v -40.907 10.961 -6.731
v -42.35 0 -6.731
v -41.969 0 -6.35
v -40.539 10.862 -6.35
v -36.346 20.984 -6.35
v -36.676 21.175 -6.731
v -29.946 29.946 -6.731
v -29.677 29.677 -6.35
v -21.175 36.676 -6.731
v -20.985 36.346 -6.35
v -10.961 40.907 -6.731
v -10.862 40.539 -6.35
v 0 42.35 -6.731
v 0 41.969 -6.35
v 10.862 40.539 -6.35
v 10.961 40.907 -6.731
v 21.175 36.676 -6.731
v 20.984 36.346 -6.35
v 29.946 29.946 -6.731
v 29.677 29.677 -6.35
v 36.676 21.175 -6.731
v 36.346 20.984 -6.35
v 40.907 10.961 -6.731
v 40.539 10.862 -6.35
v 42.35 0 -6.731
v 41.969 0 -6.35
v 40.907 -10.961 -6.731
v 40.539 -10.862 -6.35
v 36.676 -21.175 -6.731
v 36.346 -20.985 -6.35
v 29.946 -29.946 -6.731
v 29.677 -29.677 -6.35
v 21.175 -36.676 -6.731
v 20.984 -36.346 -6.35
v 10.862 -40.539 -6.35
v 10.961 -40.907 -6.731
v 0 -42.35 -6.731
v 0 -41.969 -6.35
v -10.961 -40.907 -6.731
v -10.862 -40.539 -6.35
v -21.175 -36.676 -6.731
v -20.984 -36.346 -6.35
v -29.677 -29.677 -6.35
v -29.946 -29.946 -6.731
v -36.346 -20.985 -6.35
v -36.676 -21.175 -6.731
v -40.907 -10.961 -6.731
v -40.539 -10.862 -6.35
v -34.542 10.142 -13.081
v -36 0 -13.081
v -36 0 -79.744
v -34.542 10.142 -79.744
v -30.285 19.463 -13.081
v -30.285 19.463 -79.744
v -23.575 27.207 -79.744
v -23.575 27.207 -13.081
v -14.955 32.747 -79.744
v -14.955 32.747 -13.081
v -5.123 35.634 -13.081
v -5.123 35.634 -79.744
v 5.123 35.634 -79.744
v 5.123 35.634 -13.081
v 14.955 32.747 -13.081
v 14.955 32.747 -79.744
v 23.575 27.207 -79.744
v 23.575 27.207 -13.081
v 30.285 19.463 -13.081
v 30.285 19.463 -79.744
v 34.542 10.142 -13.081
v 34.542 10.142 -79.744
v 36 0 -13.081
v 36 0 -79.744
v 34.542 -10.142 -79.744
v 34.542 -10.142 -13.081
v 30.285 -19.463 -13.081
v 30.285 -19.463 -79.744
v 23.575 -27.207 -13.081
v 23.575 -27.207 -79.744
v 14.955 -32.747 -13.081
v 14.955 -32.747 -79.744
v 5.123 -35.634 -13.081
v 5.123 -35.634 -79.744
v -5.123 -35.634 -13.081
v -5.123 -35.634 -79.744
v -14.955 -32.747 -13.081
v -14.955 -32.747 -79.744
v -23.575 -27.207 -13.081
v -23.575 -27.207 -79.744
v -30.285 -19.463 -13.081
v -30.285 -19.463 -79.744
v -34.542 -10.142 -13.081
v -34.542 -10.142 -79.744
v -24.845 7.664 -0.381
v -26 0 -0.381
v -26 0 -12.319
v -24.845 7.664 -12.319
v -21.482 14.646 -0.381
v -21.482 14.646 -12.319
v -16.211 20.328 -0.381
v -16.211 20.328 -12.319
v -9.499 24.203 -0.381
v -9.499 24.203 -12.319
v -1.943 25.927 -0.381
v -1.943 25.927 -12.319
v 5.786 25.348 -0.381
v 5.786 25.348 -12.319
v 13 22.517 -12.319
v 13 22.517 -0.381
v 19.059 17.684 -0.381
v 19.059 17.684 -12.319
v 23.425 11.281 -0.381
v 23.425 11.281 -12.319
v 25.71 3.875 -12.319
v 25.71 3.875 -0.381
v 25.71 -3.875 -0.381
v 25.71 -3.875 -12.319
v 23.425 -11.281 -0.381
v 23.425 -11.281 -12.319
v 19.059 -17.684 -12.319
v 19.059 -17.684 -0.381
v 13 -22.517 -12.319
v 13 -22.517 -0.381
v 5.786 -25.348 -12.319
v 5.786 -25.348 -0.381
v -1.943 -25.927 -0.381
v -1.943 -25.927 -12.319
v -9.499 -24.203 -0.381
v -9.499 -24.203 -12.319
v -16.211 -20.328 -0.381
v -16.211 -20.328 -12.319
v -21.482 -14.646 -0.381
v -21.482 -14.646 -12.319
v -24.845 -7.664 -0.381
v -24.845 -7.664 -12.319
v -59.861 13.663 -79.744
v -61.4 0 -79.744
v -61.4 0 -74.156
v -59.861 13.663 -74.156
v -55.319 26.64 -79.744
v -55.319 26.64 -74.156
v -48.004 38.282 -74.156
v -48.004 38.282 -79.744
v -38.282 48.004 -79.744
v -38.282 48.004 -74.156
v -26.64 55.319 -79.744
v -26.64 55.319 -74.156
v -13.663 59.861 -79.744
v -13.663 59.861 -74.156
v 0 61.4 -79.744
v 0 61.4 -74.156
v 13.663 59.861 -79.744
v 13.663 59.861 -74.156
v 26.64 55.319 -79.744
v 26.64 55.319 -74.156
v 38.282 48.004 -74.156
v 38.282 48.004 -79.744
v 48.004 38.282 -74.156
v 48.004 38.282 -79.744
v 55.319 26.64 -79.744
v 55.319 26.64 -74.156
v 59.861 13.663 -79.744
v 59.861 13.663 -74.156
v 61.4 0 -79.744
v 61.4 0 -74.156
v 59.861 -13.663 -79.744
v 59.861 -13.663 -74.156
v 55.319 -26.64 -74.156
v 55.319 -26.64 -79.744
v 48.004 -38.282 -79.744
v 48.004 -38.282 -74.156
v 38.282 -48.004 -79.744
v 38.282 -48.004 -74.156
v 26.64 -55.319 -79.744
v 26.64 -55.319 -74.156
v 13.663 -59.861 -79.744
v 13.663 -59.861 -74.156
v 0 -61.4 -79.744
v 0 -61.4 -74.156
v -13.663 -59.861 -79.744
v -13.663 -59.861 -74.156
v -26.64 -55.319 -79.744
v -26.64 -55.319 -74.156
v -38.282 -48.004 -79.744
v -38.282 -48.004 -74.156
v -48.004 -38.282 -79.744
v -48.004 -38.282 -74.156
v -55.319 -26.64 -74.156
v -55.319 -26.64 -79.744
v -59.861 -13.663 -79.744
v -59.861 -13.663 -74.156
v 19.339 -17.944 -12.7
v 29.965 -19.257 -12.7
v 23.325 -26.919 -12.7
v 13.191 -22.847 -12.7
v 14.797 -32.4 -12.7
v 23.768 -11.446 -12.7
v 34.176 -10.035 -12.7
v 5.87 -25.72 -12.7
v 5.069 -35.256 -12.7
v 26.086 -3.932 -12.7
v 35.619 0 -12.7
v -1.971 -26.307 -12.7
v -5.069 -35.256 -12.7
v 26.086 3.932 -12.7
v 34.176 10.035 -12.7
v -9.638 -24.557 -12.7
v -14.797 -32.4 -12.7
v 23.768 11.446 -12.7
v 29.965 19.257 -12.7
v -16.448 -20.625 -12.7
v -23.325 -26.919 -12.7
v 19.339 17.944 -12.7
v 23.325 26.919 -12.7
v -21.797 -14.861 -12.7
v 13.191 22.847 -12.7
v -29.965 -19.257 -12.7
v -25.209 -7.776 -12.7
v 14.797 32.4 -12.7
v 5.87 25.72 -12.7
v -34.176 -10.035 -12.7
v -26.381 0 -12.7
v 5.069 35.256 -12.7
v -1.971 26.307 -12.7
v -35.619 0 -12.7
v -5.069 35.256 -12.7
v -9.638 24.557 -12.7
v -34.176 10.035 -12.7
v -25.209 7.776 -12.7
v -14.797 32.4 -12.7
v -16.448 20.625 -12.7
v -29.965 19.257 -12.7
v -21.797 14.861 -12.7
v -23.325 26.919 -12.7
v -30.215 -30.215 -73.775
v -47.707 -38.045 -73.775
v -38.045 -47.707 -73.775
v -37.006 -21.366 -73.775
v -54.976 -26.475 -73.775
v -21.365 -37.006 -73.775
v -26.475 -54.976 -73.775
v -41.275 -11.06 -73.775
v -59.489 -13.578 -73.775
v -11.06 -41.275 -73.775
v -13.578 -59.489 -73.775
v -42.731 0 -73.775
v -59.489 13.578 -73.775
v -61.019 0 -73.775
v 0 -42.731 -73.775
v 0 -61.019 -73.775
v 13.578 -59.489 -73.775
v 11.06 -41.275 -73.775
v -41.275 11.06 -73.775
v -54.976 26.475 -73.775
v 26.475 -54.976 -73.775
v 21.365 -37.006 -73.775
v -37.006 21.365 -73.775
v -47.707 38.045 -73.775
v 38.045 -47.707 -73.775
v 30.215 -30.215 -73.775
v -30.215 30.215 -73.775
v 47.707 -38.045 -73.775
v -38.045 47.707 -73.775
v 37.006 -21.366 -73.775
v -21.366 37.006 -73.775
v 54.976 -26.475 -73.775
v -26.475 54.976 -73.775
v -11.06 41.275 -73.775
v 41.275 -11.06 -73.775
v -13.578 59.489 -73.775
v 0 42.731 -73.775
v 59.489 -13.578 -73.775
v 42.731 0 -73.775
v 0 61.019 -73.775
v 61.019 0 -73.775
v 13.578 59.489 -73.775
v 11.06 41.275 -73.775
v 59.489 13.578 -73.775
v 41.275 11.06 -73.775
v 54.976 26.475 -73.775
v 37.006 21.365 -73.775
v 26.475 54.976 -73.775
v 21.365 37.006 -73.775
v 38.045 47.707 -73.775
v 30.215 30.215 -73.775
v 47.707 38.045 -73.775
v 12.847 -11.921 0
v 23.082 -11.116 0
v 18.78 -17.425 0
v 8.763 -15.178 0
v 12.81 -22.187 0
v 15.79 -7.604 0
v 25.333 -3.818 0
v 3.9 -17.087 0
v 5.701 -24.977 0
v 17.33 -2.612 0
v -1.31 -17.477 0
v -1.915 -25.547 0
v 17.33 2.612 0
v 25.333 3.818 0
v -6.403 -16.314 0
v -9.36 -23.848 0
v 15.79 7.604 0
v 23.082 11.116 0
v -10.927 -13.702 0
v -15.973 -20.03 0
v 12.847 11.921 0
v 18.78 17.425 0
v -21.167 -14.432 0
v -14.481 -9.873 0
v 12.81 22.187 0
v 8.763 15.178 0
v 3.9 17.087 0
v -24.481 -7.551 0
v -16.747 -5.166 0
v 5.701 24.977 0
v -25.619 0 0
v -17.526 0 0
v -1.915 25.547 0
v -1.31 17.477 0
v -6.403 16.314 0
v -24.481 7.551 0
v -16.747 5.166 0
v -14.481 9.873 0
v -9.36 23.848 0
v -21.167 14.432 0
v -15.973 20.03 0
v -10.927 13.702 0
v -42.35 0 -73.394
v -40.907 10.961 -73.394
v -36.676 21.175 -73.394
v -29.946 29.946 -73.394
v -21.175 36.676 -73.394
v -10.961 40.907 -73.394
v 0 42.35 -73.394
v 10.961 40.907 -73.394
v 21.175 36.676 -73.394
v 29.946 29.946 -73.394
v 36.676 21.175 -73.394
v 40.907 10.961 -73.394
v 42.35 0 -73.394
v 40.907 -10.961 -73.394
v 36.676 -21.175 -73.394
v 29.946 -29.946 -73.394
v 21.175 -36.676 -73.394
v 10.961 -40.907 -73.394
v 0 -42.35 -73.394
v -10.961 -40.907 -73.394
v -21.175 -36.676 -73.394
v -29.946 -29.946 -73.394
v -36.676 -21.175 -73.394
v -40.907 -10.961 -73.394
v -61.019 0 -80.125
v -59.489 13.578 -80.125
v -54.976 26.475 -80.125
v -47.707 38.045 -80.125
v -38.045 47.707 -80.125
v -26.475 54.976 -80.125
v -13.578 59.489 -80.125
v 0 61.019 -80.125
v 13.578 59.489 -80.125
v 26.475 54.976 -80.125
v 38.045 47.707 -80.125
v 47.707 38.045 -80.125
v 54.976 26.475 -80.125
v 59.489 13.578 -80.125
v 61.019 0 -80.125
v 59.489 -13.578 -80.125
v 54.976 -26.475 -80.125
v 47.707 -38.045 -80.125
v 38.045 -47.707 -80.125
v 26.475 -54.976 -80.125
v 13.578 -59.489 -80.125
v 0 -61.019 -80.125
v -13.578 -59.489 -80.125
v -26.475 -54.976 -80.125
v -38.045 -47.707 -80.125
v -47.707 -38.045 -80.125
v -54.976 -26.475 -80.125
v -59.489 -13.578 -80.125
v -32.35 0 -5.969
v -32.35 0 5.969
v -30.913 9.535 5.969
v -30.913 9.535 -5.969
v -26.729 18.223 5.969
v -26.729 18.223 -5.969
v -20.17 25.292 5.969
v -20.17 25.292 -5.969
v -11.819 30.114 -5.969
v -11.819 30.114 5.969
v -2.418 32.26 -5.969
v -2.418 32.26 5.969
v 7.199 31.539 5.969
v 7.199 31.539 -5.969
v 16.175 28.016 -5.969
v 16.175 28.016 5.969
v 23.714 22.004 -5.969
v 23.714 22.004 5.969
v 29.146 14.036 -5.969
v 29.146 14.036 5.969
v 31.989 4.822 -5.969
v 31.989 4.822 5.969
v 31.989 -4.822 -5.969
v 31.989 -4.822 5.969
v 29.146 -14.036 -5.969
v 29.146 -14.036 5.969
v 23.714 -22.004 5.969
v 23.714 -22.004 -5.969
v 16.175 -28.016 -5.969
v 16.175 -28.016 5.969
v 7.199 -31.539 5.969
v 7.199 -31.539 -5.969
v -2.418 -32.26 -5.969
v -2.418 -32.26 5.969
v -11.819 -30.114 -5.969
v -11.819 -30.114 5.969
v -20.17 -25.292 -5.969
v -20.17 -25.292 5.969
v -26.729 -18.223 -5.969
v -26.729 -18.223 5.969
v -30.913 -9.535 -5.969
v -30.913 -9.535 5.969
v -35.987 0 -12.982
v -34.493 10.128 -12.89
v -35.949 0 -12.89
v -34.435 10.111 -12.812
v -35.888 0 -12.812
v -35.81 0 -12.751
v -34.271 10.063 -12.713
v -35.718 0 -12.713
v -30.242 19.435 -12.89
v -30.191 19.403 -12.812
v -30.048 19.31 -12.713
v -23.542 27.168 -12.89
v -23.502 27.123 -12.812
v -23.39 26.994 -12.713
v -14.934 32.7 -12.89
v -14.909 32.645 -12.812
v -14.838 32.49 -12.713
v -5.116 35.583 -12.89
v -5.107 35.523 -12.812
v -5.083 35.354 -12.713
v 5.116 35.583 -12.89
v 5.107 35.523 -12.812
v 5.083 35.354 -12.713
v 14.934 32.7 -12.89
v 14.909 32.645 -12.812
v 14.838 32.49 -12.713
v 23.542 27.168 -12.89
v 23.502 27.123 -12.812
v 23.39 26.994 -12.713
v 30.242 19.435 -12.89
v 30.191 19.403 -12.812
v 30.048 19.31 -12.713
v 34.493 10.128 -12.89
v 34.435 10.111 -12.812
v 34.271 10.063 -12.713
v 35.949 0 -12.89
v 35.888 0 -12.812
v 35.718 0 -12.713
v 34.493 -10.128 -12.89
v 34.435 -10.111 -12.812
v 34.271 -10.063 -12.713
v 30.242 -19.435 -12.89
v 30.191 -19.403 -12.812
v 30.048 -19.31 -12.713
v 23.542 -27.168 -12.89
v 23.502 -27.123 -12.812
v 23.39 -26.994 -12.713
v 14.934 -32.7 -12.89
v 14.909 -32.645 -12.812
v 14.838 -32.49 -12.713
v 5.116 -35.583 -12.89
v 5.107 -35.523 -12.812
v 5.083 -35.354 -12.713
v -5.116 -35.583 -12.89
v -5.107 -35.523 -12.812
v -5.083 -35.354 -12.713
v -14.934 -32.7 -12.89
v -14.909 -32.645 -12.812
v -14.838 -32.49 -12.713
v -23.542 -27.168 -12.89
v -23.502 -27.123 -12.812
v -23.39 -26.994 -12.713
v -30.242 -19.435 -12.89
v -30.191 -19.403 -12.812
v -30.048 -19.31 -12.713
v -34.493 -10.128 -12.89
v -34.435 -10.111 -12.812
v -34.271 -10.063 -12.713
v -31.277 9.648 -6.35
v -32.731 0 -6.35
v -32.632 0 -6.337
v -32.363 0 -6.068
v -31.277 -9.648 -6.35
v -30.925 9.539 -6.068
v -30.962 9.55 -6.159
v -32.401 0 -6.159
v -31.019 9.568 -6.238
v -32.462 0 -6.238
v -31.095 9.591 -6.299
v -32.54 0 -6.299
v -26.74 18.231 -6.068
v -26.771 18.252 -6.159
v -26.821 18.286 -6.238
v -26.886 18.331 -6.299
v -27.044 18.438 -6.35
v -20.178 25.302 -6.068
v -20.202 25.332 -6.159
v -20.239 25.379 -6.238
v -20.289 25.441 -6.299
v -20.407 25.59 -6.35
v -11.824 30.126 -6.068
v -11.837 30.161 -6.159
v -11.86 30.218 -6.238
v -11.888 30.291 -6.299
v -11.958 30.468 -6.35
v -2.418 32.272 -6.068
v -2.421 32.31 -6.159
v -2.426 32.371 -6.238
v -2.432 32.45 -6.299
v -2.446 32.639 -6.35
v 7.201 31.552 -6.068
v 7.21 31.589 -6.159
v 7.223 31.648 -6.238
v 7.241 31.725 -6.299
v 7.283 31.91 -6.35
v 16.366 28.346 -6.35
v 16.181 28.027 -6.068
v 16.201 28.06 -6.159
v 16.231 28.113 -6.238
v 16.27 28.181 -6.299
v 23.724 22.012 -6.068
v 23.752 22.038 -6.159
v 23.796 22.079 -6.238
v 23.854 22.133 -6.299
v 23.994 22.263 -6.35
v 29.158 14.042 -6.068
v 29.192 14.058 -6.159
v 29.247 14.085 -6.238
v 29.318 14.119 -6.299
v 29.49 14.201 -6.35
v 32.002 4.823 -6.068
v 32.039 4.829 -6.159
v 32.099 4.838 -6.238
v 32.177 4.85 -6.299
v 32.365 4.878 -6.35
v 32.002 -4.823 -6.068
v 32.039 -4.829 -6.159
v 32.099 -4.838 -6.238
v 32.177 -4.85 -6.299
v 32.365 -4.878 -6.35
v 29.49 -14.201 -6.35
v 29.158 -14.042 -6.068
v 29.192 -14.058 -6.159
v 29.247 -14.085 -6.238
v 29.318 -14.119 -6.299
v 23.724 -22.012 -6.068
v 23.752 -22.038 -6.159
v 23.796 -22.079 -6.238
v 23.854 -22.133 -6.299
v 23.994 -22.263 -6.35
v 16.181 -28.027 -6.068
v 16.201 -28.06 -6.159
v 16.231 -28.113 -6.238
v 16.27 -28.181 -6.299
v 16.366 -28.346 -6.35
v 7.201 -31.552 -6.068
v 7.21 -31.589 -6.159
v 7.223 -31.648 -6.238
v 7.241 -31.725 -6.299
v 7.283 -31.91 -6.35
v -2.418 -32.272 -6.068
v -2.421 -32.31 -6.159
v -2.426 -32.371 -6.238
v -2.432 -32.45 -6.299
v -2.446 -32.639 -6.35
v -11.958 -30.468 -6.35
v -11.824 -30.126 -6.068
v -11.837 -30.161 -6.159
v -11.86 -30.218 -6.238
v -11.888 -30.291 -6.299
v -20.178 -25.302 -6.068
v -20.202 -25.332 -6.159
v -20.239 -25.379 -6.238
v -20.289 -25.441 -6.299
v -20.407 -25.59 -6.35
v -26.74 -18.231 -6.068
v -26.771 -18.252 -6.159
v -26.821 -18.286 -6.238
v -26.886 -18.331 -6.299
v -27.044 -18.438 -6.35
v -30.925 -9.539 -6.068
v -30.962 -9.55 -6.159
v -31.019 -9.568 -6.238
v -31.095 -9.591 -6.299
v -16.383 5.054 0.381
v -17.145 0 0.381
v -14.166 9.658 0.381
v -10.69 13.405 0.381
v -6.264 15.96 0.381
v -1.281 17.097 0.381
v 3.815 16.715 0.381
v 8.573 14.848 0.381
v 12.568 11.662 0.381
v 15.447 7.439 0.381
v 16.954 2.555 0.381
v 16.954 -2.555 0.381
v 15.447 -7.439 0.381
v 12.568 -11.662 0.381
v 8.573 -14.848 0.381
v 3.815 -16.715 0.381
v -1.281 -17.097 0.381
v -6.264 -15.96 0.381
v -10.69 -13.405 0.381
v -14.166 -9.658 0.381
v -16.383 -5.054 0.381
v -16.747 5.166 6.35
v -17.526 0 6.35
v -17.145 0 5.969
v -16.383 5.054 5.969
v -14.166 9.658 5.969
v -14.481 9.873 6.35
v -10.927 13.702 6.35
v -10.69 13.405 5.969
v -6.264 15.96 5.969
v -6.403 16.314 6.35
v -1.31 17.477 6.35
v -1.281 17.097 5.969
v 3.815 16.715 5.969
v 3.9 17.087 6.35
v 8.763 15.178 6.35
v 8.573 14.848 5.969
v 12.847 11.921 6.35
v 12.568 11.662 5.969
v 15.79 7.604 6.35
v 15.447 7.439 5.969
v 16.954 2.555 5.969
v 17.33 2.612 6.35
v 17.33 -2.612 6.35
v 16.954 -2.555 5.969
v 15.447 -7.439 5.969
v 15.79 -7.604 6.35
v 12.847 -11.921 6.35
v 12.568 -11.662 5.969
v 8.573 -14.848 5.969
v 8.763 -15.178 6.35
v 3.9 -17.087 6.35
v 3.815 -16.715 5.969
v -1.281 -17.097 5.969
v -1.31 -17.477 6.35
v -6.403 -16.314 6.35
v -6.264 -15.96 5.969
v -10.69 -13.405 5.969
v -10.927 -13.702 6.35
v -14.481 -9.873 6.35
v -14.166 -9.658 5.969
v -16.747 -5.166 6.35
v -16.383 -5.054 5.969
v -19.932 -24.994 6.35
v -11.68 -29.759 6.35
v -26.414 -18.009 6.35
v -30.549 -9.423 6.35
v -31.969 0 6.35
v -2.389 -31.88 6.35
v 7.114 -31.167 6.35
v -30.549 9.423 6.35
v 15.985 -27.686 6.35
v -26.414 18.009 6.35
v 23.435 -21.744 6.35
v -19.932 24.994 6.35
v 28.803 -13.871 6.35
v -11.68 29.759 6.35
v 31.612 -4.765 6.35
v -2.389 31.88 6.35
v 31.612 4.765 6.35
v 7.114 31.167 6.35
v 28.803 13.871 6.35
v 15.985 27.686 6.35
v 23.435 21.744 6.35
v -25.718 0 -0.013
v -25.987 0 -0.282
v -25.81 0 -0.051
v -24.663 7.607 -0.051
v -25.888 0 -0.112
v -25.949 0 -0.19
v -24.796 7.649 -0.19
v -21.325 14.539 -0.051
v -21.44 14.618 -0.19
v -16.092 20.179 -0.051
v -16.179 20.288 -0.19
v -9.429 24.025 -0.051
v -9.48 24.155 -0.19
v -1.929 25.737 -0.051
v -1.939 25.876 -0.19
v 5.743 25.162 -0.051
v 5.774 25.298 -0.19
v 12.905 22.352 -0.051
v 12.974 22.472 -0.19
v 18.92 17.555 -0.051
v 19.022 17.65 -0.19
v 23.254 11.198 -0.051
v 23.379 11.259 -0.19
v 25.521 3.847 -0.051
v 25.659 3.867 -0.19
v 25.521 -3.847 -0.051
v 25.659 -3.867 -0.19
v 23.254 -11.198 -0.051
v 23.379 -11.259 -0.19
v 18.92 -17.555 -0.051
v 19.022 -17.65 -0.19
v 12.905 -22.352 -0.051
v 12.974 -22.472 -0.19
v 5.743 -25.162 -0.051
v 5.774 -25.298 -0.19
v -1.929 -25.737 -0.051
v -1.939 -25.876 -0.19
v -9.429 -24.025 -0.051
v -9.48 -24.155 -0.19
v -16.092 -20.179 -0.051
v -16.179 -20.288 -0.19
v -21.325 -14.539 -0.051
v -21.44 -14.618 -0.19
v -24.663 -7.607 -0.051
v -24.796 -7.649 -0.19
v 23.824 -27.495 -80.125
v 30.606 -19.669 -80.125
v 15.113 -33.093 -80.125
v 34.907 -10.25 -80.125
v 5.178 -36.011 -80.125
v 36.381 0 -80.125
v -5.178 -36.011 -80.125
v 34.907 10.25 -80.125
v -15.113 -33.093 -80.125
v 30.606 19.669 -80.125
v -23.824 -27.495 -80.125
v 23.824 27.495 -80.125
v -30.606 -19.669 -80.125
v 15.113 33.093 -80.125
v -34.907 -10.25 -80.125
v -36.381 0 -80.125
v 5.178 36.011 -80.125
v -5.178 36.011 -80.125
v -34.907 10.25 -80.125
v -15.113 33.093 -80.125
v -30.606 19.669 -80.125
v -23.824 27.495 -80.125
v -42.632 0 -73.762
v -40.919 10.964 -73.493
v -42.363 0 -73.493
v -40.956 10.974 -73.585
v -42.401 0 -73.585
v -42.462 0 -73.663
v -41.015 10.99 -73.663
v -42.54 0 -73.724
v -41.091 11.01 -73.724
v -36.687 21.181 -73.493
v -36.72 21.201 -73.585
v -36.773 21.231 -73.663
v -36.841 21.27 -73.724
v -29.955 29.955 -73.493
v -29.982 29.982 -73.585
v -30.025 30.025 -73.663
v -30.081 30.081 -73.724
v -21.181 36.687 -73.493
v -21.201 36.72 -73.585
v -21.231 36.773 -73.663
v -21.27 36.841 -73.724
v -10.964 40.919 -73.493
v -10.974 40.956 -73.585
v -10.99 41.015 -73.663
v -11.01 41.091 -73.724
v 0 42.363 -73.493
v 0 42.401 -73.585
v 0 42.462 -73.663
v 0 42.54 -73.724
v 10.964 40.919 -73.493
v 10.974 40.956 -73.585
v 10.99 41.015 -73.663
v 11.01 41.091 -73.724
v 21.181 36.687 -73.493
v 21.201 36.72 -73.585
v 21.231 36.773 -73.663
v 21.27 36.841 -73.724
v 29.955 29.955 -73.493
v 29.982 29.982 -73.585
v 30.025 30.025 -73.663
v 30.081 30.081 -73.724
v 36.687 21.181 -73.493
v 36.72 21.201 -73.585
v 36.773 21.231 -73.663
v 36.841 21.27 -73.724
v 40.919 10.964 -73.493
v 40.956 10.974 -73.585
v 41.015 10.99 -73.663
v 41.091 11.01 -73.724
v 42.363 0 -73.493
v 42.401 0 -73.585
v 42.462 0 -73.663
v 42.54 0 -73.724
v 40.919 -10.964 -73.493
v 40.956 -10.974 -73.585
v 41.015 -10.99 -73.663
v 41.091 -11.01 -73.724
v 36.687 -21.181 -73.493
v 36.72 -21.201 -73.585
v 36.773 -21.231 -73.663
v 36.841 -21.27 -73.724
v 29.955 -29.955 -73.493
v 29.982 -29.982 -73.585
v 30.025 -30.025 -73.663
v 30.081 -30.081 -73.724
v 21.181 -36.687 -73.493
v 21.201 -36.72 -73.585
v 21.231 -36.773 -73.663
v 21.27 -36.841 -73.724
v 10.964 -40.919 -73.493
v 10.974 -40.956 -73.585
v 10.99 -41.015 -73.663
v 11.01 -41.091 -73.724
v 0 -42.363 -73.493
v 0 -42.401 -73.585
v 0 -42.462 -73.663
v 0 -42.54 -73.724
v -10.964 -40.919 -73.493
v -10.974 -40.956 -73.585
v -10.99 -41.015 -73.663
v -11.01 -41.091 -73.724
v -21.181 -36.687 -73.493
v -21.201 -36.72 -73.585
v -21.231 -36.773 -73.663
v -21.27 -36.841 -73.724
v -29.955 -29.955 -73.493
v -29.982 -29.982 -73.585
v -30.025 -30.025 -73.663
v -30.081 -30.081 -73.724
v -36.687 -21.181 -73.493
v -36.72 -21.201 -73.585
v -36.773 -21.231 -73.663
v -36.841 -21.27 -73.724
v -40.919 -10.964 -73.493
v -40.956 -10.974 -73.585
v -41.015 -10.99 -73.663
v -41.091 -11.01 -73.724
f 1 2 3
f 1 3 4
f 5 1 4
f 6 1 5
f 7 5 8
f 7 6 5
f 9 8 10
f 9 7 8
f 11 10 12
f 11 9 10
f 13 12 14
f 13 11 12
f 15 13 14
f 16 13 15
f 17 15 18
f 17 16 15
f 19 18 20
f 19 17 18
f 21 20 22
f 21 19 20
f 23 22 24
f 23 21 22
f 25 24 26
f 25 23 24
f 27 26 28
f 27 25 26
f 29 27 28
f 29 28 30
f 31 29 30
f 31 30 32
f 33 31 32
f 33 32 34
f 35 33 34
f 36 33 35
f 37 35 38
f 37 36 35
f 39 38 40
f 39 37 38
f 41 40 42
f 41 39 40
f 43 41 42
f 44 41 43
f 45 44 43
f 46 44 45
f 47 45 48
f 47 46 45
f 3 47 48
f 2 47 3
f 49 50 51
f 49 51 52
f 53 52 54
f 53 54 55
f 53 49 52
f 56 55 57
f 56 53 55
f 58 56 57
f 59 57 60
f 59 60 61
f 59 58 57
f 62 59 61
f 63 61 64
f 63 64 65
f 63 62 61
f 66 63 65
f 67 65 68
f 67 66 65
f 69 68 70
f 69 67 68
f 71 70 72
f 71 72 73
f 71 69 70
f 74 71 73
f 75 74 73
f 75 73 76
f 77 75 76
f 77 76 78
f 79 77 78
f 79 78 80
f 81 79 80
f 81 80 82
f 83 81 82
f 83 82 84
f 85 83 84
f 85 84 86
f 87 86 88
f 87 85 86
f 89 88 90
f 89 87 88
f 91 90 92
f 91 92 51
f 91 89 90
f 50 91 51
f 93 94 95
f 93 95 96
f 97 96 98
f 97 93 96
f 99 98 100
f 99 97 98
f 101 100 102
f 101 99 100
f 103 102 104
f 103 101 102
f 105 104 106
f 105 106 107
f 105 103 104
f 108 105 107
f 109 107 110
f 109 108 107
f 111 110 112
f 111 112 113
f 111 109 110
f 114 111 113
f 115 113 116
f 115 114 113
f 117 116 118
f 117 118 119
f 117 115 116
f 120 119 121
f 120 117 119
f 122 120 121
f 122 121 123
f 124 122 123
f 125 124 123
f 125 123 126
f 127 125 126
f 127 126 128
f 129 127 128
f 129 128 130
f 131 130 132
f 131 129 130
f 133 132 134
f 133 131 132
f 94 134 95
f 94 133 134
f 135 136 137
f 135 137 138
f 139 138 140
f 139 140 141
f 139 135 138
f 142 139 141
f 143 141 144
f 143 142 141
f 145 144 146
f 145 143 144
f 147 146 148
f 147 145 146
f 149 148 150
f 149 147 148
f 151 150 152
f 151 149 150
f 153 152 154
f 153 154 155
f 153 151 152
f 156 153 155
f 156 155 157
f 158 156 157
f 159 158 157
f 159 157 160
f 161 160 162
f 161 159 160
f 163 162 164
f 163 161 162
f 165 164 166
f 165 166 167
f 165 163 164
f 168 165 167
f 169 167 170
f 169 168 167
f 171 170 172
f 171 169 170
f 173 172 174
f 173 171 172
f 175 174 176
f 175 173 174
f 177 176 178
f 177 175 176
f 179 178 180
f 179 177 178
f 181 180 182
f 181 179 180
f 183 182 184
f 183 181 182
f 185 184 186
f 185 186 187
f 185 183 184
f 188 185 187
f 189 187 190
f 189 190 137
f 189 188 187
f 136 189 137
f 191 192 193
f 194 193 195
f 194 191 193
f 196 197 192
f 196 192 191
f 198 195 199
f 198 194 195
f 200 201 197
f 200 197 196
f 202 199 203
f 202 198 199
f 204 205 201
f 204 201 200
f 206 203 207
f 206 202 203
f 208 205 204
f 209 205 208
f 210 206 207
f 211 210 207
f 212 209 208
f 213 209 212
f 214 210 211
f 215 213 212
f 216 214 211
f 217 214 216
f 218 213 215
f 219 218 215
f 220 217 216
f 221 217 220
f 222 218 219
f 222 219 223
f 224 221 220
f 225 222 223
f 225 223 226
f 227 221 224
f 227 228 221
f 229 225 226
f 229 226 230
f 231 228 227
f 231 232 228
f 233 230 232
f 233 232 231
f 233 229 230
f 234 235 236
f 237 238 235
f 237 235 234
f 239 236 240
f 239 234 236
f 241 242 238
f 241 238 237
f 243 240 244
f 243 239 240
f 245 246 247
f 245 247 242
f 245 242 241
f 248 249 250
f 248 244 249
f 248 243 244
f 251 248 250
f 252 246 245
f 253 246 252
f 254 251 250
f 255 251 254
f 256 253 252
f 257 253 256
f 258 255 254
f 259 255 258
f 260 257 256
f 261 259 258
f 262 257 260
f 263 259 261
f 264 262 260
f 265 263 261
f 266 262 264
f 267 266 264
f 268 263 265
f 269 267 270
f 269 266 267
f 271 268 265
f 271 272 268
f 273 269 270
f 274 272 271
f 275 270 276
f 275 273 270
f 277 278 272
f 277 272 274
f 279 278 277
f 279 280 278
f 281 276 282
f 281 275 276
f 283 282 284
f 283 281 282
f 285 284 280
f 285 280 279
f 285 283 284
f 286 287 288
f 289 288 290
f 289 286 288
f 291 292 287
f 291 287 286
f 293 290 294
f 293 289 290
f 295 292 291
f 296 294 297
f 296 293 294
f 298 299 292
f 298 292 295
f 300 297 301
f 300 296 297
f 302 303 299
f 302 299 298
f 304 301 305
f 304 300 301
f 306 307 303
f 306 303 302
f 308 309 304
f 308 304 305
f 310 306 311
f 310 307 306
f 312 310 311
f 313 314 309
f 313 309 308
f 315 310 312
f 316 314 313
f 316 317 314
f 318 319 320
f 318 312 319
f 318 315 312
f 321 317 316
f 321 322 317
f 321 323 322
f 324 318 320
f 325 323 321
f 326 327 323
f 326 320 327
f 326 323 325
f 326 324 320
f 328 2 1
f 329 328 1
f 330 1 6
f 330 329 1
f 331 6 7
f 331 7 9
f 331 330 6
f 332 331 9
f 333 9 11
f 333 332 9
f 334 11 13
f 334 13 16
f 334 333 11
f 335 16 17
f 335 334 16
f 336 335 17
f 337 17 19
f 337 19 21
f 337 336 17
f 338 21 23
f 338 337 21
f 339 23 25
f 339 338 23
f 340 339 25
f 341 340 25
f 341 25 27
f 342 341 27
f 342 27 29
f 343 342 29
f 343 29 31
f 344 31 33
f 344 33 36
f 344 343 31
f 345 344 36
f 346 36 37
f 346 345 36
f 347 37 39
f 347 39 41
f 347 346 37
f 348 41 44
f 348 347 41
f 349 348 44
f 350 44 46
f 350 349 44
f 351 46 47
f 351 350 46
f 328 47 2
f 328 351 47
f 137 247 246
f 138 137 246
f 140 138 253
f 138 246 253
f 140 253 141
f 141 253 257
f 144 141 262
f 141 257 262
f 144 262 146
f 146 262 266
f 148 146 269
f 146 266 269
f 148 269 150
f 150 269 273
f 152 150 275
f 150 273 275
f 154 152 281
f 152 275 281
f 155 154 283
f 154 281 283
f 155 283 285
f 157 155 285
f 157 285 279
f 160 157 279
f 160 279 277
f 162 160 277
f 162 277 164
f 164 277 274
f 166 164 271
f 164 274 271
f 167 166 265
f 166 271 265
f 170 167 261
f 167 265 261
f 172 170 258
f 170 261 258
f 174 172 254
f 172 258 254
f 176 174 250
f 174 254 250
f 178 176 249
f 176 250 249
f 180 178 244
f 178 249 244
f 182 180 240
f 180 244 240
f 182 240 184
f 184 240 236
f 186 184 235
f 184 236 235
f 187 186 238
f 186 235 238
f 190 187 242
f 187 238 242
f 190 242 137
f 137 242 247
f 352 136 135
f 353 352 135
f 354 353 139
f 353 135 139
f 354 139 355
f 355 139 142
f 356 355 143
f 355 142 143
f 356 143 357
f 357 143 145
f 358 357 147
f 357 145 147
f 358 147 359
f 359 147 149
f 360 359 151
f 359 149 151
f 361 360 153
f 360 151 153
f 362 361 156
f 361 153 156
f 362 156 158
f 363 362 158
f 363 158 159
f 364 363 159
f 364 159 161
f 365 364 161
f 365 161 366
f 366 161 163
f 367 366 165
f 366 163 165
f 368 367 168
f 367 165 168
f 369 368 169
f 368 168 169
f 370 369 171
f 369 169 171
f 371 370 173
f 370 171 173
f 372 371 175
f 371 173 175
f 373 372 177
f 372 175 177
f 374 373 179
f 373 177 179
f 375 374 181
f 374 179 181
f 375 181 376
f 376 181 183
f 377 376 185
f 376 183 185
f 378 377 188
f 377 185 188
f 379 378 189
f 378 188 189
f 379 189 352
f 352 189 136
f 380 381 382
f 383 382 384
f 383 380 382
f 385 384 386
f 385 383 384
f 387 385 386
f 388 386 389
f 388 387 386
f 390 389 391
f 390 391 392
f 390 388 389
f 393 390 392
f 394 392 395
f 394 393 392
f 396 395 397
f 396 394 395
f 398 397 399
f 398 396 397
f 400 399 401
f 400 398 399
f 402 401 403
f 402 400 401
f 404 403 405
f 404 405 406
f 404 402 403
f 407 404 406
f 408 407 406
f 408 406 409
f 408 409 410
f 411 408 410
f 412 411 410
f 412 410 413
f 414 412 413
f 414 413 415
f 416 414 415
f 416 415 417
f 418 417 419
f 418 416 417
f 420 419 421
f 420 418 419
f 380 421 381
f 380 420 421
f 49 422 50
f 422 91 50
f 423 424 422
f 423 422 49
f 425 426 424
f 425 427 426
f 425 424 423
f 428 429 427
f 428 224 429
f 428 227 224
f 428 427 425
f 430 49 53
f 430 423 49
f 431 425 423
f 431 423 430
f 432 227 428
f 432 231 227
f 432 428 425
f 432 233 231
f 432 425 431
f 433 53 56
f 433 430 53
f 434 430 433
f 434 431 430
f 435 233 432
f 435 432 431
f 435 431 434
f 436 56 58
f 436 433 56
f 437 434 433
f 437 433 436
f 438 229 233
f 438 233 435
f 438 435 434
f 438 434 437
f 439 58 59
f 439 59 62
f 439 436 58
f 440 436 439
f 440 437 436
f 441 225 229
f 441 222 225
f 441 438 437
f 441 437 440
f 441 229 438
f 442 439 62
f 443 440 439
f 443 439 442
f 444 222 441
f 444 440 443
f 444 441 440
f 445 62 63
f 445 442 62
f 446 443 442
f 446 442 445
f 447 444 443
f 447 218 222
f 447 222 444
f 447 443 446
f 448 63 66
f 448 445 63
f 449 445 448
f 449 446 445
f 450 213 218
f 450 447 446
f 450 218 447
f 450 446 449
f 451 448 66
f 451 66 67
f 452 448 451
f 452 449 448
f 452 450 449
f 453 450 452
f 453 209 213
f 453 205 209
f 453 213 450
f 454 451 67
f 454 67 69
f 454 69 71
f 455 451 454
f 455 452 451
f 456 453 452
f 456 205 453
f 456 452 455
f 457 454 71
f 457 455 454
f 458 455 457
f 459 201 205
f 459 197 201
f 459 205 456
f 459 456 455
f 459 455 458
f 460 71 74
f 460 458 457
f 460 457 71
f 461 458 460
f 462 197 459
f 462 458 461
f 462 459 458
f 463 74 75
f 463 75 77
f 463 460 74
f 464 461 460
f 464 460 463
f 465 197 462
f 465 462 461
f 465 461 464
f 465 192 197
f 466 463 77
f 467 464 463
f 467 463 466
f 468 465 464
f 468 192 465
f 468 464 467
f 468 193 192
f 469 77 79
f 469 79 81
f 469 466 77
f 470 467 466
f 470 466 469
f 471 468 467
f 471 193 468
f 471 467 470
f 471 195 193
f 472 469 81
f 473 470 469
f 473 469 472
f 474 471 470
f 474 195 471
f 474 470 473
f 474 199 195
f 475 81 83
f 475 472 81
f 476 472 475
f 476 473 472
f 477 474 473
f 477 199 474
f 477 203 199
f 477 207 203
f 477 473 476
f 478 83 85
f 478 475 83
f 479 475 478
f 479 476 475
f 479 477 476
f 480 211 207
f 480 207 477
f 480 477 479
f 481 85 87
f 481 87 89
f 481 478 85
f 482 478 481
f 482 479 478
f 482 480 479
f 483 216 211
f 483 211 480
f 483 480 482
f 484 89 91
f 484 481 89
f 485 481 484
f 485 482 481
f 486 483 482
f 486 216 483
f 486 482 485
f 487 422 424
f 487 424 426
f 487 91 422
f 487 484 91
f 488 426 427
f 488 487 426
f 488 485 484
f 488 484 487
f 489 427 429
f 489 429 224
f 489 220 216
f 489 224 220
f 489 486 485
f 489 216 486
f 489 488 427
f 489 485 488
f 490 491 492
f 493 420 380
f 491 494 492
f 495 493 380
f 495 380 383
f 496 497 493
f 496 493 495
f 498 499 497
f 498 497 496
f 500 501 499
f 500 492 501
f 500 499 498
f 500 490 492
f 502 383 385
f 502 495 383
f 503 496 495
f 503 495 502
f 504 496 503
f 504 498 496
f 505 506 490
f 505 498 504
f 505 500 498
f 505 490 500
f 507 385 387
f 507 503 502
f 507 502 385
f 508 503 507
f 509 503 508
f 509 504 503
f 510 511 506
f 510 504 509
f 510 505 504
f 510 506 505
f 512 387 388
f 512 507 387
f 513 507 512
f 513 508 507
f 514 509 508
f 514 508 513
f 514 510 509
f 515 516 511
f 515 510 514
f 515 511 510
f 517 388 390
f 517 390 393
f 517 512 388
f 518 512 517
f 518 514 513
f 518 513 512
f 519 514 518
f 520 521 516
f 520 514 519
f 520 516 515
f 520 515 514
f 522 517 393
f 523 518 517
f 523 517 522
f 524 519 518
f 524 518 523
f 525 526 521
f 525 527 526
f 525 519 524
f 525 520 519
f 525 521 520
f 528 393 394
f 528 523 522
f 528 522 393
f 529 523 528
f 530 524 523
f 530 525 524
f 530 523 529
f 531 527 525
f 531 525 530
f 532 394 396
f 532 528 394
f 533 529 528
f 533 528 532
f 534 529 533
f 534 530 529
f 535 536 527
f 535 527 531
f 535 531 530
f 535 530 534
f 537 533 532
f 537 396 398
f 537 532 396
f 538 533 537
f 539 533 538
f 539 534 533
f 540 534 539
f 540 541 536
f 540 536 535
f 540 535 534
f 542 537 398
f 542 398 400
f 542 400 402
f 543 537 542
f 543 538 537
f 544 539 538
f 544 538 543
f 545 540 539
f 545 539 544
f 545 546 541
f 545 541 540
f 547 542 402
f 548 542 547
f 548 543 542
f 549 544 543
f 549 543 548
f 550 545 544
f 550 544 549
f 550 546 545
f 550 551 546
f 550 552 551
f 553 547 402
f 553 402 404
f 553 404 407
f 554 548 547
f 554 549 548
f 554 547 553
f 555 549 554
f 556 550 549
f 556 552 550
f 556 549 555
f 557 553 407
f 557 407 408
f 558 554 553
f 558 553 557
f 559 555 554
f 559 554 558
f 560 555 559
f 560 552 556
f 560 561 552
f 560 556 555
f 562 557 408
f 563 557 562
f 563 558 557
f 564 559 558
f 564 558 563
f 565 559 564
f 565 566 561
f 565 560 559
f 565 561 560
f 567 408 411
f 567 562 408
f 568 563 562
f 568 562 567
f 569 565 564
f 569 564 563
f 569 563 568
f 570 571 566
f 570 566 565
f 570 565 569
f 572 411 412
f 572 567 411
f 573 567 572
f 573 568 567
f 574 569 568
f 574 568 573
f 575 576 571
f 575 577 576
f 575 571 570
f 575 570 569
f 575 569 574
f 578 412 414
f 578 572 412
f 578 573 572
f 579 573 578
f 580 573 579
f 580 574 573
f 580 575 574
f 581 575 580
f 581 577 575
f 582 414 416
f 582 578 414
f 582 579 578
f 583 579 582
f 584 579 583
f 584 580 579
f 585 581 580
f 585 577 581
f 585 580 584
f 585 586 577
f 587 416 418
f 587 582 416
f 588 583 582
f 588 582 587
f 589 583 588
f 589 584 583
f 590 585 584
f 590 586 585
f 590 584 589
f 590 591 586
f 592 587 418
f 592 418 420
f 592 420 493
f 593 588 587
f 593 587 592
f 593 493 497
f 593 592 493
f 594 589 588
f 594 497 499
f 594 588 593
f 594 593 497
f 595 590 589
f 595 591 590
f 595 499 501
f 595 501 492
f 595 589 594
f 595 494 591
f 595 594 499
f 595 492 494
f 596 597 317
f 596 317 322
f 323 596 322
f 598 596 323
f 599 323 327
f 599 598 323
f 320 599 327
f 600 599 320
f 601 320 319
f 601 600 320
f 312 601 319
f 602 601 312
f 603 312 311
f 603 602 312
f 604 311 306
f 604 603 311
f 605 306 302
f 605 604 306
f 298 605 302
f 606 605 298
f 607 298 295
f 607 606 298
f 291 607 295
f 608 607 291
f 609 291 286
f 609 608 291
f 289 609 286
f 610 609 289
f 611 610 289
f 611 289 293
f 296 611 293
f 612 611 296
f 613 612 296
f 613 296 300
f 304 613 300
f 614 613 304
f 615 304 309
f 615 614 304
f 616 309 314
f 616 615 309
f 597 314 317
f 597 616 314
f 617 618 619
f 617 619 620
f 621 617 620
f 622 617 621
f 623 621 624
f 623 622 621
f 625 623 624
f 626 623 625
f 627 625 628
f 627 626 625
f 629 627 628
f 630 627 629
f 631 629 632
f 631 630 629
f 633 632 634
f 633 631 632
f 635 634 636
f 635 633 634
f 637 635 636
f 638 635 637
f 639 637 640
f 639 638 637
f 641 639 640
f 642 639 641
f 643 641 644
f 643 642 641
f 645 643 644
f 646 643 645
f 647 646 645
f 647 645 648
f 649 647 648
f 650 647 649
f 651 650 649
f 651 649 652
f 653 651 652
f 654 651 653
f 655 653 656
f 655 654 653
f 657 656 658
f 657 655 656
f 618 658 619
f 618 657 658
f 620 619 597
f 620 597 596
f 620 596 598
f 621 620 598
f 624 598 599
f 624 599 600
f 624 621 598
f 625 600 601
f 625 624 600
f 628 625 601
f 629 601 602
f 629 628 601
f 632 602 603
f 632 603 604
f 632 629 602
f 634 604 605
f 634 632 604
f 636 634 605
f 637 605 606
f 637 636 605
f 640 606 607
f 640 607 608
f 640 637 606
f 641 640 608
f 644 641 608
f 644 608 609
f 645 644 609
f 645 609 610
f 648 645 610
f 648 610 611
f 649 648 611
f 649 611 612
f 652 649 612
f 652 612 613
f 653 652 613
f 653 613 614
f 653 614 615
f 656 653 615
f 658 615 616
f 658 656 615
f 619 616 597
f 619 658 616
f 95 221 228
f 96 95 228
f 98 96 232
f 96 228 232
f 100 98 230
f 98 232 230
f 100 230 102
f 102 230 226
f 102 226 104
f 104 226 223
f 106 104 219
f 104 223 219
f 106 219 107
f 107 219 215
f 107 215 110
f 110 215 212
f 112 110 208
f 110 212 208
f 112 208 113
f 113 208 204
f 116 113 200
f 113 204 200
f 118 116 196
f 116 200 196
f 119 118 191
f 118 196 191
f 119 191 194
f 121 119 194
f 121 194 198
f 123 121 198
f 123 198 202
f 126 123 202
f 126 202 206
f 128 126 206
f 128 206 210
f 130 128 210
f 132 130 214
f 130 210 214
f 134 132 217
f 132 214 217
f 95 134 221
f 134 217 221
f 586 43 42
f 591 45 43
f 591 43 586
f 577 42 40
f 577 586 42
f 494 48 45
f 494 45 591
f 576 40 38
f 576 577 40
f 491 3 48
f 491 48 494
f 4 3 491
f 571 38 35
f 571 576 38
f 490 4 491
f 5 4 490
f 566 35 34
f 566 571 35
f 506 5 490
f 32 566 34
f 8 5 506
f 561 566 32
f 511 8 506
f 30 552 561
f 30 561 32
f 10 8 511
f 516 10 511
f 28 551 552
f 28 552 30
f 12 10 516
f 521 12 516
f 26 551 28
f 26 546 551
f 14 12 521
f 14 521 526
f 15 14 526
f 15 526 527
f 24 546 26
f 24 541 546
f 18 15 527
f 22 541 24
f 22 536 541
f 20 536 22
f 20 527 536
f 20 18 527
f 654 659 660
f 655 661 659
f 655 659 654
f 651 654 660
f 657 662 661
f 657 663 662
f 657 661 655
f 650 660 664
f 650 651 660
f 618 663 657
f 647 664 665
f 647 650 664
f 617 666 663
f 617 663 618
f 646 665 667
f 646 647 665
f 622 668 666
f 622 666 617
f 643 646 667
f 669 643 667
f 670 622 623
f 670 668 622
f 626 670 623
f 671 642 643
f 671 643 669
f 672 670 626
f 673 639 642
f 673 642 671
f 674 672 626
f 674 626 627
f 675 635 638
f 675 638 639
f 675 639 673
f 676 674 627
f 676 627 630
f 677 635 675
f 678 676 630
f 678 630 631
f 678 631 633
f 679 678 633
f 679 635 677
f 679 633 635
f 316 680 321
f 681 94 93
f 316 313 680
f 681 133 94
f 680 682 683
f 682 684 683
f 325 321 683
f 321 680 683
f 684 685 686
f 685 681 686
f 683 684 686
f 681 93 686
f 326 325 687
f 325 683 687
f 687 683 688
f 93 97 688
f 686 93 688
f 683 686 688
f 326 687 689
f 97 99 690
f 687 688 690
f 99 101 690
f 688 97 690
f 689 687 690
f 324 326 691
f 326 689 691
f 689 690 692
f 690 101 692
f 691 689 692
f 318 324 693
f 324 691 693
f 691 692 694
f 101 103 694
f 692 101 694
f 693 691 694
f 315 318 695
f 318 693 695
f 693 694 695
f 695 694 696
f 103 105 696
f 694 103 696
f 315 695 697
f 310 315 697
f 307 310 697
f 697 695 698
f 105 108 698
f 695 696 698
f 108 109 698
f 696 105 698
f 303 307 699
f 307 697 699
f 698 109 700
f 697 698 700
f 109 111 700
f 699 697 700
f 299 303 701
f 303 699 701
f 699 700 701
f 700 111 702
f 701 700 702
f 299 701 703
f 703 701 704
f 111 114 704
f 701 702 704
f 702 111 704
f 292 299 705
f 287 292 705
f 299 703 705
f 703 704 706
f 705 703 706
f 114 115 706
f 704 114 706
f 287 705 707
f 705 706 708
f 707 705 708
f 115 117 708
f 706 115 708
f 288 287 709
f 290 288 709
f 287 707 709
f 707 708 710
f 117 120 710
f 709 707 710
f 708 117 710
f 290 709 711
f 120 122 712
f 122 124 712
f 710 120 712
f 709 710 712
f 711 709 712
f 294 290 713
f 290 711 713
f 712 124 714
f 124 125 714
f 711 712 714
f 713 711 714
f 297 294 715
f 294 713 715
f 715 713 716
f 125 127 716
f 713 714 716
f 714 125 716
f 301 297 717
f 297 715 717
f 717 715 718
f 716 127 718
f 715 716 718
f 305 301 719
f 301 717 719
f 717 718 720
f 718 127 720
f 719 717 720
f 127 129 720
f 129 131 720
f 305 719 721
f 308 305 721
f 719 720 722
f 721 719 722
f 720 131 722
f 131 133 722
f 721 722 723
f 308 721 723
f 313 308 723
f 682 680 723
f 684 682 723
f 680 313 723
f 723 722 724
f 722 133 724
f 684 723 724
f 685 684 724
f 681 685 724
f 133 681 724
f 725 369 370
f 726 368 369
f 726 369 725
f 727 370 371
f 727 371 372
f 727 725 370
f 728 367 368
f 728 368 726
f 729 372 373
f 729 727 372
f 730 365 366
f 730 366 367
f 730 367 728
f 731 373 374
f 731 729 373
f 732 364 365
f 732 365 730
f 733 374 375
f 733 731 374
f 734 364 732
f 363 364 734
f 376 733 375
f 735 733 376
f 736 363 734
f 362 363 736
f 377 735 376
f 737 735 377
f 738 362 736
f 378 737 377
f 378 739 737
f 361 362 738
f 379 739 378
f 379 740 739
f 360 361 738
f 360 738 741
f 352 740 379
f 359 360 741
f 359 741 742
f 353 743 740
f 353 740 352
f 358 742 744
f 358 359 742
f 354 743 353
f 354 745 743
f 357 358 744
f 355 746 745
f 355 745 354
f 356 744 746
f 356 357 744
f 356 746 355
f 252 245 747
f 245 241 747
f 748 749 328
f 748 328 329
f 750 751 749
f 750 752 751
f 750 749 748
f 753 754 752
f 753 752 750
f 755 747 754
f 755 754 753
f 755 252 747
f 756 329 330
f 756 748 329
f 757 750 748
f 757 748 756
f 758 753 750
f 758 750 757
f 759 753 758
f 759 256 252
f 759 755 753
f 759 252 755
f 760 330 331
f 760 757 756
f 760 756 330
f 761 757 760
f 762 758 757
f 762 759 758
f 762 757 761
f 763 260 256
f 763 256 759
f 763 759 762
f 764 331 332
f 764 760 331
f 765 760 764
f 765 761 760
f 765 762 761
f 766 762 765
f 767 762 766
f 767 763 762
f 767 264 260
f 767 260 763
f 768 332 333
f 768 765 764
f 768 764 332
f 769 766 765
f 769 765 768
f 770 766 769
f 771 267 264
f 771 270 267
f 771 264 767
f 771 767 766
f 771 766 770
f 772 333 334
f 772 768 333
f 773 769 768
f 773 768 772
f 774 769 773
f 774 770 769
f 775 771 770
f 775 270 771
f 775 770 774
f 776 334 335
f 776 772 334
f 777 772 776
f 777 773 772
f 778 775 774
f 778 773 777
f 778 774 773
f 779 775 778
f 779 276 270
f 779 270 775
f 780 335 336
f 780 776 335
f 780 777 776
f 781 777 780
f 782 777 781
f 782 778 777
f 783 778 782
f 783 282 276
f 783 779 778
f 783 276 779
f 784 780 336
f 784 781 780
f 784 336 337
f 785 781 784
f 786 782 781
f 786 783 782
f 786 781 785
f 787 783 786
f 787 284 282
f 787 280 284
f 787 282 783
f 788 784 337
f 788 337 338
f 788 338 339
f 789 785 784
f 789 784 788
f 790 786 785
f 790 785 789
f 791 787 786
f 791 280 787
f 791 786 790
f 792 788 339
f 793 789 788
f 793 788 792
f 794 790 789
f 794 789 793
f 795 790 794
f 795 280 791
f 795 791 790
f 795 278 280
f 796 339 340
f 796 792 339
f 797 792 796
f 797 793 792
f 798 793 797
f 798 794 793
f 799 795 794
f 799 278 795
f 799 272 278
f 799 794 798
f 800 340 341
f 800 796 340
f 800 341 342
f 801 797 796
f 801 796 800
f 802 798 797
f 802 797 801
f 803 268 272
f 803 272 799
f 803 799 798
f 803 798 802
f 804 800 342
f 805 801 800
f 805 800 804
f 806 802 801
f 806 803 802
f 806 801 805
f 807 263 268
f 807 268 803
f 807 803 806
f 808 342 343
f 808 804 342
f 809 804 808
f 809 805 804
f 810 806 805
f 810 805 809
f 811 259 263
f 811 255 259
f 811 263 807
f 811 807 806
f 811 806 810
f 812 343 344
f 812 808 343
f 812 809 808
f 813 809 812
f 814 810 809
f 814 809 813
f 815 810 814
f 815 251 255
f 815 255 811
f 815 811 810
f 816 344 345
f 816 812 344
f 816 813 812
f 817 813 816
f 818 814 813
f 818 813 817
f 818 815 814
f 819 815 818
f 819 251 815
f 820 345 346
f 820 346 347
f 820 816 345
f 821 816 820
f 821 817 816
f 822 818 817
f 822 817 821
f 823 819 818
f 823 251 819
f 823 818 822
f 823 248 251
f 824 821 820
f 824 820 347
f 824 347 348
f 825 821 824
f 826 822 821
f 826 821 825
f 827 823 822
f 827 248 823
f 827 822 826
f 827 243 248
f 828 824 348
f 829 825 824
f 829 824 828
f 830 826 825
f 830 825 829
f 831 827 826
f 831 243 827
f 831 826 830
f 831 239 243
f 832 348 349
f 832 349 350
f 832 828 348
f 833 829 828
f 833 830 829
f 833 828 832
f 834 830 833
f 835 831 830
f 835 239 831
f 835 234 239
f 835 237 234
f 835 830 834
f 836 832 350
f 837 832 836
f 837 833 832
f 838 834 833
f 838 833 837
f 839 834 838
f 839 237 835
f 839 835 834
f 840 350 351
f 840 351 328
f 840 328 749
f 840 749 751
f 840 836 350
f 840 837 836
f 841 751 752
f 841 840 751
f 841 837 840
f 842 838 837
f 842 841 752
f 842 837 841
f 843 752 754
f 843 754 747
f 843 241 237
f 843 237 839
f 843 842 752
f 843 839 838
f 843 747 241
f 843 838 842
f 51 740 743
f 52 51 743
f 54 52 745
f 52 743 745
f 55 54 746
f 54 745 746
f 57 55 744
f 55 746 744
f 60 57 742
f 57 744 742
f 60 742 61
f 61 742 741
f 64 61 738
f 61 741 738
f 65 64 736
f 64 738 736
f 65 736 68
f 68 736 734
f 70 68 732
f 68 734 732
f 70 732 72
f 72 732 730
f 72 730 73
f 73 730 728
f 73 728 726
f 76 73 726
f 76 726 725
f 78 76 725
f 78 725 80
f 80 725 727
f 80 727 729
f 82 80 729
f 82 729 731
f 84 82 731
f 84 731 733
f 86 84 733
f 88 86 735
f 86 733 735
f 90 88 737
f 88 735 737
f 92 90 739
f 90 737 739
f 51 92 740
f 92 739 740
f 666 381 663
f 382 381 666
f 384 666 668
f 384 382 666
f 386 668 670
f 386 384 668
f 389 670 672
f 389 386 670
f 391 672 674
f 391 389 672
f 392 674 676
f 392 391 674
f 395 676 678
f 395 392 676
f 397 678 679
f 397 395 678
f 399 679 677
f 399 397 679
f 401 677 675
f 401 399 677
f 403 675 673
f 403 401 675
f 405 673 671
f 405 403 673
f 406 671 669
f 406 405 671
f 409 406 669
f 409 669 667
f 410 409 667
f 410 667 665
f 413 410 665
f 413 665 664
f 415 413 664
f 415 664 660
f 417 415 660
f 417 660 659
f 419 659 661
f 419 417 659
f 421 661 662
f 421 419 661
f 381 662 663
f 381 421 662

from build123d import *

# Parameters (mm, degrees)
F2_R    = 0.381
F3_SIZE = 0.381


with BuildPart() as f1:
    # F0 (on Front) → F1 (revolve)
    with BuildSketch(Plane.XZ):
        Polygon((-26, 0), (-17.145, 0), (-17.145, 6.35), (-32.35, 6.35), (-32.35, -6.35), (-42.35, -6.35), (-42.35, -73.775001), (-61.4, -73.775001), (-61.4, -80.125001), (-36, -80.125001), (-36, -12.7), (-26, -12.7), align=None)
    revolve(axis=Axis((0, 0, -27.375497), (0, 0, -1)))

    # F2
    f2_edges = [f1.edges().sort_by_distance(p)[0] for p in [
        (32.35, 0, -6.35),
        (42.35, 0, -73.775001),
        (36, 0, -12.7),
        (26, 0, 0),
    ]]
    fillet(f2_edges, radius=F2_R)

    # F3
    f3_edges = [f1.edges().sort_by_distance(p)[0] for p in [
        (32.35, 0, 6.35),
        (17.145, 0, 6.35),
        (42.35, 0, -6.35),
        (61.4, 0, -73.775001),
        (61.4, 0, -80.125001),
        (36, 0, -80.125001),
        (26, 0, -12.7),
        (17.145, 0, 0),
    ]]
    chamfer(f3_edges, length=F3_SIZE)


solid = f1.part
